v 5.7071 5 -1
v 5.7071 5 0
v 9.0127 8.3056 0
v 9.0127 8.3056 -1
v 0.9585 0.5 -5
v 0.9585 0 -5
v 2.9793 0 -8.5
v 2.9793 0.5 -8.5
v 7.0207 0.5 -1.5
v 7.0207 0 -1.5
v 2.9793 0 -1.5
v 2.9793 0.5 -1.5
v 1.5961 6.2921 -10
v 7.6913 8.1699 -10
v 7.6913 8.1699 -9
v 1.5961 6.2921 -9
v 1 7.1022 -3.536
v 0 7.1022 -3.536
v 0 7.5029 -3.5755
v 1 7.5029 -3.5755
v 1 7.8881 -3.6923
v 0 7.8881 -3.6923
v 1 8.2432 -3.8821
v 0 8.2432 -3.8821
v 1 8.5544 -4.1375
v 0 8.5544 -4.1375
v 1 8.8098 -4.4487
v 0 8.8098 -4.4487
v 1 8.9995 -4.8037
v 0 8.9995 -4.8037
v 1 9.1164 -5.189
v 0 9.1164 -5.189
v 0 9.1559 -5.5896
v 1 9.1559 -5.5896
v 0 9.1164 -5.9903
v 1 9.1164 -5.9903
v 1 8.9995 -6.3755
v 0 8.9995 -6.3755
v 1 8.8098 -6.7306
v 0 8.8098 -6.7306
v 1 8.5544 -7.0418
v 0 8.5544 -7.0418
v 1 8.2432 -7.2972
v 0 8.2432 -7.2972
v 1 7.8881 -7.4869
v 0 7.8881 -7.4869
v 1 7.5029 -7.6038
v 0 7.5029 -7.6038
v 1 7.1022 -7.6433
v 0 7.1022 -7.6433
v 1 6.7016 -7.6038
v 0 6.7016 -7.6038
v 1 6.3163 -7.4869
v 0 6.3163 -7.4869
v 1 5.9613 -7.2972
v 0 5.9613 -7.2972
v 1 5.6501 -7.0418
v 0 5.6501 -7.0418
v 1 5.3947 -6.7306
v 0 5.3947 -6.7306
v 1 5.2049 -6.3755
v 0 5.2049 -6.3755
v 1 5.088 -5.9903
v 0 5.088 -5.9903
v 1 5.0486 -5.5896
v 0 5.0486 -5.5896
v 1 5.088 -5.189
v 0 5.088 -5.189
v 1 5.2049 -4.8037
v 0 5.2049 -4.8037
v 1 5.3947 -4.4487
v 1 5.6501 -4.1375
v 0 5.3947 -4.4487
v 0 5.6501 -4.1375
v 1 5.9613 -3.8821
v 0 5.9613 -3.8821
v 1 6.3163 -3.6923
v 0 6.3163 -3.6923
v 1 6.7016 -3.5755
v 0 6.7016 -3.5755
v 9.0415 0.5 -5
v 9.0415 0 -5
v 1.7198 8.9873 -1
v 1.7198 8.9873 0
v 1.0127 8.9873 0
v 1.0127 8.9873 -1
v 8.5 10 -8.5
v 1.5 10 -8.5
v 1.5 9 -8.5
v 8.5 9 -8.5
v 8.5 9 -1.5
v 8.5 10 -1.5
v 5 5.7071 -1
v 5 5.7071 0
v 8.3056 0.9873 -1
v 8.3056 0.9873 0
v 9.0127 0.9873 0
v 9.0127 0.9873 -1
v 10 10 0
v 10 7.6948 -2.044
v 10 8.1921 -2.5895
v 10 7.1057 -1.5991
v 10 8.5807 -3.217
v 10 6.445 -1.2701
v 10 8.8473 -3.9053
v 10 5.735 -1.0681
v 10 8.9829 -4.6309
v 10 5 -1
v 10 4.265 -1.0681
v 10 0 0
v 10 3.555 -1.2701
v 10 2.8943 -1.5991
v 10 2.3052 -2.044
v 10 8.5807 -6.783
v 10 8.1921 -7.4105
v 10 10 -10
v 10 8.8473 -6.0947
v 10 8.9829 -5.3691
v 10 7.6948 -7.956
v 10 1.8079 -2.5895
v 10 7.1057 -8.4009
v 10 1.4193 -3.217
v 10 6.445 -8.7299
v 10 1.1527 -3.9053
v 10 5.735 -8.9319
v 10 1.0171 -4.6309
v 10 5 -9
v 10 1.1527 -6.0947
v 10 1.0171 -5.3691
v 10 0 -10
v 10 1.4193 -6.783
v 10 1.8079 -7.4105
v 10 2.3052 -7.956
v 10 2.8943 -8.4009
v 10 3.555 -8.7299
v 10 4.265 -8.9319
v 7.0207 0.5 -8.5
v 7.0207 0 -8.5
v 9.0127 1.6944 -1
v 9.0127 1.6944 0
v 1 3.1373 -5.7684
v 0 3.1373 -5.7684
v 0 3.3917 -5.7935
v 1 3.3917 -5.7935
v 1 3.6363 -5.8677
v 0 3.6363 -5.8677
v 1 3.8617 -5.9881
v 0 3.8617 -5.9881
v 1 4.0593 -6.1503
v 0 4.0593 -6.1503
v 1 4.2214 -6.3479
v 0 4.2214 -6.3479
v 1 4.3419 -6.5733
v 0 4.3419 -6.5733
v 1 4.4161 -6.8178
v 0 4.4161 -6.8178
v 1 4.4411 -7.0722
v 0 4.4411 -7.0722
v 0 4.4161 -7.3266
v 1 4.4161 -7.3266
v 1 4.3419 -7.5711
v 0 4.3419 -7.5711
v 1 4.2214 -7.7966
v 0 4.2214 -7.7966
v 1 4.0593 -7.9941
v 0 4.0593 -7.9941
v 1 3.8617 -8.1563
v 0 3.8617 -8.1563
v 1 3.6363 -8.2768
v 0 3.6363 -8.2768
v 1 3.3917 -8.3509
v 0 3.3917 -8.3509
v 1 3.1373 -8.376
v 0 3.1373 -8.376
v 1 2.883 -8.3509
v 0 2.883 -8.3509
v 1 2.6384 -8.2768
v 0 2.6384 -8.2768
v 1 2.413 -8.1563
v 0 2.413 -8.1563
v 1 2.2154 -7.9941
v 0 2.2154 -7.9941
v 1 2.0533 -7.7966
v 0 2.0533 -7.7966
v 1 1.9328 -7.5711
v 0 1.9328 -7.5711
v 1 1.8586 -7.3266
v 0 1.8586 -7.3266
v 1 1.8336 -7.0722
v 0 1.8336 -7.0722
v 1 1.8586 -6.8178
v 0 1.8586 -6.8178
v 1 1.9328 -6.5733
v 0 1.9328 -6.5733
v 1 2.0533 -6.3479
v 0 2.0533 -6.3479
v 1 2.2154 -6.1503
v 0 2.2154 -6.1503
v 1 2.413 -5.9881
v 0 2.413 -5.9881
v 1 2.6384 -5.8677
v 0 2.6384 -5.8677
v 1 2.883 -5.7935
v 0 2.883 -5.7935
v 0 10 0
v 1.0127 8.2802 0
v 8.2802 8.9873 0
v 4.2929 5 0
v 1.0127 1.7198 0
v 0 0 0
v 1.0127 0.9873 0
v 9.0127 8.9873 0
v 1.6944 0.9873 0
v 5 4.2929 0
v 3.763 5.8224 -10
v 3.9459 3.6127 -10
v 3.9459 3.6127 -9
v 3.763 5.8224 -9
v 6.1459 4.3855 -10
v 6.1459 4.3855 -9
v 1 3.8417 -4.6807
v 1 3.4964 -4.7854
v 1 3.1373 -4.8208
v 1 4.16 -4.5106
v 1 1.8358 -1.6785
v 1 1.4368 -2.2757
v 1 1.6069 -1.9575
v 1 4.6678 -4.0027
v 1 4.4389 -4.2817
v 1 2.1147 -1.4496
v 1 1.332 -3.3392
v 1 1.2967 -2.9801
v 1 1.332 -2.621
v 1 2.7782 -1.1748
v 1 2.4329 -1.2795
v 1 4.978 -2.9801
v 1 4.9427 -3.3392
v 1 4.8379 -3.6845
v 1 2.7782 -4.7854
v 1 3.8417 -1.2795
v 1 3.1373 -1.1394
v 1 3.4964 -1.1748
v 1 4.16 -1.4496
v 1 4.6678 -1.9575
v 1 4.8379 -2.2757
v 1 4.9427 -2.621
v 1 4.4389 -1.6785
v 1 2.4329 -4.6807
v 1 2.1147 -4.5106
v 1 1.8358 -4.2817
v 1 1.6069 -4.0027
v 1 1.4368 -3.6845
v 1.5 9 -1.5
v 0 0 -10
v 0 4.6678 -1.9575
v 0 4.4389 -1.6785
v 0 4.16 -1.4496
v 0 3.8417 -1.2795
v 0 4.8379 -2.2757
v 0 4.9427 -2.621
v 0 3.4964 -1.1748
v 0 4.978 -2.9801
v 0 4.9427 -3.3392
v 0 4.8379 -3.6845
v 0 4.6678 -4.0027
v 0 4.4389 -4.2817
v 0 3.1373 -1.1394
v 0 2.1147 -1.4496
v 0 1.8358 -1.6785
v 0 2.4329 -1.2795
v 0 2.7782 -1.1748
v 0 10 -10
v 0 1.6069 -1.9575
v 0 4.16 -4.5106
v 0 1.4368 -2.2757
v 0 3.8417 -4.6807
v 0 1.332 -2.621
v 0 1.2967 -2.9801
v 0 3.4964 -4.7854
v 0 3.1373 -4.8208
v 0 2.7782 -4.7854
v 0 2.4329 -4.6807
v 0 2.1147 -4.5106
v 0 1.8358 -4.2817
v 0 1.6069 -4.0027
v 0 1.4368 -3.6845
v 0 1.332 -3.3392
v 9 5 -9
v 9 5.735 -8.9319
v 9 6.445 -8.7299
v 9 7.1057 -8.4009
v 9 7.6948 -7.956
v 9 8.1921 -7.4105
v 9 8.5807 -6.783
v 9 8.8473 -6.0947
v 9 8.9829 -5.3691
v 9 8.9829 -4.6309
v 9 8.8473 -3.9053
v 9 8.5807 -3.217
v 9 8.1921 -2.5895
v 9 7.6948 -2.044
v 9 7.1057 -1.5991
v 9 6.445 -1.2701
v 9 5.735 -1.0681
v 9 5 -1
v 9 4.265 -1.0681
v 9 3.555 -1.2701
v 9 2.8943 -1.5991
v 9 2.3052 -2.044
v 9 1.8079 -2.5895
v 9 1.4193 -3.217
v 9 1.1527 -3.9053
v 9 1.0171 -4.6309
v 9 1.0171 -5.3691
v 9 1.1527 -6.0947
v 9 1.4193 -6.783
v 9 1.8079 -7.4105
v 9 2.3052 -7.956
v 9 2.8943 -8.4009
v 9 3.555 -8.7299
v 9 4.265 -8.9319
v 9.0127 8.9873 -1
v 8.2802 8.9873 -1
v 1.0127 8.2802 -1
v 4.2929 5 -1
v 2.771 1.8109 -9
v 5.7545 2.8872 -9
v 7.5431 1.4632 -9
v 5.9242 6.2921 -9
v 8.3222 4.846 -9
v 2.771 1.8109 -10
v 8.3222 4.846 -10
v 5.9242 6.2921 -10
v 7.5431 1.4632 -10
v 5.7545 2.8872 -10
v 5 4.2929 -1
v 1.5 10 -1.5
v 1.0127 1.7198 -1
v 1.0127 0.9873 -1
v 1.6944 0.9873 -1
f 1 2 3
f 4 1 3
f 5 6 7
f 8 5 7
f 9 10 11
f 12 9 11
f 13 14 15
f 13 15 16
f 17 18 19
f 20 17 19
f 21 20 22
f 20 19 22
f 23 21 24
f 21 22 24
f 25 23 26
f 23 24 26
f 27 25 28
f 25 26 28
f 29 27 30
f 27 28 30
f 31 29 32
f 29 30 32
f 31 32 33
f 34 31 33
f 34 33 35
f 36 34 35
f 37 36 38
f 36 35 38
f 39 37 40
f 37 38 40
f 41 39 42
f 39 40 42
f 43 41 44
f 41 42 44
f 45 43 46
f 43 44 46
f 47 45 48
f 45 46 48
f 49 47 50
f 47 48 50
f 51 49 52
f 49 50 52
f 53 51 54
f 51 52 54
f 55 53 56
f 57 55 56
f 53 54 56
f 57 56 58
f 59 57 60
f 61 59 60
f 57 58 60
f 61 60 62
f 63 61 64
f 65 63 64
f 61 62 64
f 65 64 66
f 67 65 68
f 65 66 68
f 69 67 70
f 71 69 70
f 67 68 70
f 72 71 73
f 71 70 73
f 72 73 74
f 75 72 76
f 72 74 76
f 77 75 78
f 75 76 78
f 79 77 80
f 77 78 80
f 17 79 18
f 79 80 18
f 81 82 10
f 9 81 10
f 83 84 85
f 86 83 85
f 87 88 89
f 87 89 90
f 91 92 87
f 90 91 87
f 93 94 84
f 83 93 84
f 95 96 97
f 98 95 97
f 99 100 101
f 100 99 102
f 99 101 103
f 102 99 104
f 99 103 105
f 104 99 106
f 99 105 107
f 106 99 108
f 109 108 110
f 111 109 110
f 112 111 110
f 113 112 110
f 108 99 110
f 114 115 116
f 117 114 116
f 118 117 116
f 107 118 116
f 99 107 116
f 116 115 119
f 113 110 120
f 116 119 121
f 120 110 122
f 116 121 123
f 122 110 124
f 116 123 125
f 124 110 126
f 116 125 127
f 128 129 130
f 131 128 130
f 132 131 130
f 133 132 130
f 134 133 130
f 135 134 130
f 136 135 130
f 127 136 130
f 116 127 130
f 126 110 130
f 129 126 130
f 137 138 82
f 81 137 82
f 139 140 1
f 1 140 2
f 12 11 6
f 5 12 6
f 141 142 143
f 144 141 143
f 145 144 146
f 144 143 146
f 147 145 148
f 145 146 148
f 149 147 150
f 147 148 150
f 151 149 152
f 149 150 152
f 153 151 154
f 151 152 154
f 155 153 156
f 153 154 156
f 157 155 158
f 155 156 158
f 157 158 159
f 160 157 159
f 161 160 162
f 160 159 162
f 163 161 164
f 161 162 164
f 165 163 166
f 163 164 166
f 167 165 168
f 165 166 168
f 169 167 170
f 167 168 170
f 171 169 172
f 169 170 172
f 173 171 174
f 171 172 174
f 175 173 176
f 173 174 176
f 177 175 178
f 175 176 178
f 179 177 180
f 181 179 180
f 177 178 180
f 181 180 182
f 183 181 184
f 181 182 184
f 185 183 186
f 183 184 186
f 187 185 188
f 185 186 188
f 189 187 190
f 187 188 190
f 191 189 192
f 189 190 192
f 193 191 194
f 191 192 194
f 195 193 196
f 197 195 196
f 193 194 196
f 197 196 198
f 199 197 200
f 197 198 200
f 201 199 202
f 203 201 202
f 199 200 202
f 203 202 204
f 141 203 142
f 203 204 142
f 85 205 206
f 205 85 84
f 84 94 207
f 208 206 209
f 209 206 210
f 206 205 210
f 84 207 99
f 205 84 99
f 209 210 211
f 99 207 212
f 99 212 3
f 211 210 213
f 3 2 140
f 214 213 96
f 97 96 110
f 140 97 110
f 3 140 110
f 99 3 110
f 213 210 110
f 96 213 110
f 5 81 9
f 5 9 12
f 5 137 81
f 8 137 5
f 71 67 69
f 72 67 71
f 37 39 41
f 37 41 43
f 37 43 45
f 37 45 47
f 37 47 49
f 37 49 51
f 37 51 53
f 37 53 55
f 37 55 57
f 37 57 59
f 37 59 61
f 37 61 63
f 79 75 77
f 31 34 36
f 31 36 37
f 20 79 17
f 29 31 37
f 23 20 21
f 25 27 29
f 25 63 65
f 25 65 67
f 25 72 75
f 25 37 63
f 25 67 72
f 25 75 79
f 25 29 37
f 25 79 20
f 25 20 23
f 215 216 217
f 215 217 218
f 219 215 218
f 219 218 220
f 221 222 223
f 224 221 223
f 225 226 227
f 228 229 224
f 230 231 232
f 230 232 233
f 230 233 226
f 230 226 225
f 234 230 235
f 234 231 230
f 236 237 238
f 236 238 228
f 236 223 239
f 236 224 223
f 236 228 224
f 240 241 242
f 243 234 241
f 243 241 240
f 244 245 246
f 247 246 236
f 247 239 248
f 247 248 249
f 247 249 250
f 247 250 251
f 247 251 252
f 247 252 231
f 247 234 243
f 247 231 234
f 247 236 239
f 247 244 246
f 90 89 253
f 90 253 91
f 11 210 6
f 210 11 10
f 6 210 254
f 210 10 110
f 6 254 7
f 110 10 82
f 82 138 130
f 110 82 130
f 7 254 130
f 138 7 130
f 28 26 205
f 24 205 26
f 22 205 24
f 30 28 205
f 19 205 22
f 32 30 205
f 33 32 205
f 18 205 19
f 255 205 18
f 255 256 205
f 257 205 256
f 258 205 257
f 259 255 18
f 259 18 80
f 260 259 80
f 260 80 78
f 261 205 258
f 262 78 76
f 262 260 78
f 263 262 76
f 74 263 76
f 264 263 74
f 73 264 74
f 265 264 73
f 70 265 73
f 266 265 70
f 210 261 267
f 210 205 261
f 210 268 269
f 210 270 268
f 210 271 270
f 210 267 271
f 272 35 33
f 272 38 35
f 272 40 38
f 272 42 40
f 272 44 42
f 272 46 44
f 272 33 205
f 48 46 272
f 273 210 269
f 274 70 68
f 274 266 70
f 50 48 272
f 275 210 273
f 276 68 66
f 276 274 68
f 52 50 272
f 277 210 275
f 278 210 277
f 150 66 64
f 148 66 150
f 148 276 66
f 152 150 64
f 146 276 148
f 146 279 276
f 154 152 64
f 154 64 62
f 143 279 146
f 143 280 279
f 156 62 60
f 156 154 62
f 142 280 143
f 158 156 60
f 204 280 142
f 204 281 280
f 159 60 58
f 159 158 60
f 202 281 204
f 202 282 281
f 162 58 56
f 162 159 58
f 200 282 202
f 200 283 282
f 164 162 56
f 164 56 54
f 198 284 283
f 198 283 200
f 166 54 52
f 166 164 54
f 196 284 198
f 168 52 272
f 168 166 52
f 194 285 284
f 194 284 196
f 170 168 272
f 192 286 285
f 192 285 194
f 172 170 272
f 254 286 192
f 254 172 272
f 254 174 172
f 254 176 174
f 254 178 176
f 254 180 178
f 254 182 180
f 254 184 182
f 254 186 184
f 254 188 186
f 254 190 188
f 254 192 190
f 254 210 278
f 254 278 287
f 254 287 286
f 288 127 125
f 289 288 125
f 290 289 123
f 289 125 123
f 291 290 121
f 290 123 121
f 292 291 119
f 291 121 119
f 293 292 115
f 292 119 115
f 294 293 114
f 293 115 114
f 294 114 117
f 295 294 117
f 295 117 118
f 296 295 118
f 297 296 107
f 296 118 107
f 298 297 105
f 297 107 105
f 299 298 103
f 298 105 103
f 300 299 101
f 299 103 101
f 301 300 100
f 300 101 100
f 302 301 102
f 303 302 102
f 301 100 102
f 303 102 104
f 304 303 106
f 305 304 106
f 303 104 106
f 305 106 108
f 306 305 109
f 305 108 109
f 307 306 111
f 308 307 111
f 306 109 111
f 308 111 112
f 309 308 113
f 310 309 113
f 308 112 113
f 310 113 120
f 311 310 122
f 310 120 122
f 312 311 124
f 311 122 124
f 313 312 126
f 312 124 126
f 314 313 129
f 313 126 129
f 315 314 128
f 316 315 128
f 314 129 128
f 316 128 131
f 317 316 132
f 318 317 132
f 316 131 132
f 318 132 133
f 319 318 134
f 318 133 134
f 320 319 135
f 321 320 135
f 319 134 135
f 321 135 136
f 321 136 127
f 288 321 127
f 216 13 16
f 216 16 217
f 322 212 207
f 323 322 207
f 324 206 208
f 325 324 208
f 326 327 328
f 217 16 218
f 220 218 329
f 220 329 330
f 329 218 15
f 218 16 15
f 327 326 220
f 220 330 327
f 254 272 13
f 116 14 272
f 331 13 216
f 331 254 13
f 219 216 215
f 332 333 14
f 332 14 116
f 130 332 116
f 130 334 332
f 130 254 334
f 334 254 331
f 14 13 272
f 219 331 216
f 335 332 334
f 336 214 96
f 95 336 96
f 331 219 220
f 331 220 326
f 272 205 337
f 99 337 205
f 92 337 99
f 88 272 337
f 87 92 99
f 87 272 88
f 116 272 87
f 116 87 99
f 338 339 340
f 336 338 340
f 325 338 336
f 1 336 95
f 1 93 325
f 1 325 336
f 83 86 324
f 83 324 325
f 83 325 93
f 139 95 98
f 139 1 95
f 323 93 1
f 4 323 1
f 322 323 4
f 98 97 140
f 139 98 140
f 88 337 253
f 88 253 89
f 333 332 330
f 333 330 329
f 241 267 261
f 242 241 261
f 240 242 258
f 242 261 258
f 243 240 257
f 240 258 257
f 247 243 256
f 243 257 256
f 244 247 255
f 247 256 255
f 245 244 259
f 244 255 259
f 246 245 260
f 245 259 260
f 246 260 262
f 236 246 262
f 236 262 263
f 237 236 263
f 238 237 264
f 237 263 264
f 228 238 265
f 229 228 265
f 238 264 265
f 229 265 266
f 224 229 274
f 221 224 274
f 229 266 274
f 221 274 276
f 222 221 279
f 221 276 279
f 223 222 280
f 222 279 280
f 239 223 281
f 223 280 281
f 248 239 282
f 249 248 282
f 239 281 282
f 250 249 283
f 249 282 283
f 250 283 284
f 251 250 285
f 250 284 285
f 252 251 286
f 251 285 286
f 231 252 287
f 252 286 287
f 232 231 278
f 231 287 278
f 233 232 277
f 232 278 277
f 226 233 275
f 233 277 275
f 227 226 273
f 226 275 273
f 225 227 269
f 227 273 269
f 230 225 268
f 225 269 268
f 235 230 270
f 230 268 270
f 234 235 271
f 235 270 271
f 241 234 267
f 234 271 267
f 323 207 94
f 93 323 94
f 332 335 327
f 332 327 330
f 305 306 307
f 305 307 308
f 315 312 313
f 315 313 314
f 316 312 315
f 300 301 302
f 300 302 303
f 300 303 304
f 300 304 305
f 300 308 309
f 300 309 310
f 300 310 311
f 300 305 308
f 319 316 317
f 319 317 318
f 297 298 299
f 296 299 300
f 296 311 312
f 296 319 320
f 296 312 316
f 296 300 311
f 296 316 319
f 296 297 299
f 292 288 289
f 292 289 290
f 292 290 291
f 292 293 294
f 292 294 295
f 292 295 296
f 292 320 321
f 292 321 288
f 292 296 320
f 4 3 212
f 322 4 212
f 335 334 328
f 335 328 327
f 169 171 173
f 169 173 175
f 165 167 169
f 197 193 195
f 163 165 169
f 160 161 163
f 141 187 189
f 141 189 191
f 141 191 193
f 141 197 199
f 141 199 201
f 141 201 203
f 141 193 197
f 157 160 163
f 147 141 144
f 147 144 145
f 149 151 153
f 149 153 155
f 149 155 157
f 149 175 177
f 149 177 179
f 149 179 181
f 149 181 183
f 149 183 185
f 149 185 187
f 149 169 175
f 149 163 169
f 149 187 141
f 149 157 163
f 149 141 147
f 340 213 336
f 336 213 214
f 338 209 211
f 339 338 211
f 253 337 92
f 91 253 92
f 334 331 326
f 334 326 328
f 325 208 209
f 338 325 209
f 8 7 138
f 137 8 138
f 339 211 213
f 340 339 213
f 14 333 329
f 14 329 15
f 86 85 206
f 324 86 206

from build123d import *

# Parameters (mm, degrees)
SKETCH2_W           = 10
SKETCH2_H           = 10
BOSS_EXTRUDE1_DEPTH = 10
CUT_EXTRUDE1_DEPTH  = 1
SKETCH4_R           = 4
CUT_EXTRUDE2_DEPTH  = 1
SKETCH5_W           = 7
SKETCH5_H           = 7
CUT_EXTRUDE3_DEPTH  = 1
CUT_EXTRUDE4_DEPTH  = 1
SKETCH7_R           = 1.303792798
SKETCH7_R_2         = 2.05363311
SKETCH7_R_3         = 1.840686576
CUT_EXTRUDE5_DEPTH  = 1
CUT_EXTRUDE13_DEPTH = 0.5


with BuildPart() as part:
    # Sketch2 → Boss-Extrude1 (new body)
    with BuildSketch(Plane(origin=(0, 0, 0), x_dir=(1, 0, 0), z_dir=(0, 1, 0))):
        with Locations((5, 5)):
            Rectangle(SKETCH2_W, SKETCH2_H)
    extrude(amount=BOSS_EXTRUDE1_DEPTH)

    # Sketch3 → Cut-Extrude1 (cut)
    with BuildSketch(Plane.XY):
        Polygon((8.305584857, 0.987308362), (9.012691638, 0.987308362), (9.012691638, 1.694415143), (5.707106781, 5), (9.012691638, 8.305584857), (9.012691638, 8.987308362), (8.280201581, 8.987308362), (5, 5.707106781), (1.719798419, 8.987308362), (1.012691638, 8.987308362), (1.012691638, 8.280201581), (4.292893219, 5), (1.012691638, 1.719798419), (1.012691638, 0.987308362), (1.694415143, 0.987308362), (5, 4.292893219), align=None)
    extrude(amount=-CUT_EXTRUDE1_DEPTH, mode=Mode.SUBTRACT)

    # Sketch4 → Cut-Extrude2 (cut)
    with BuildSketch(Plane(origin=(10, 0, 0), x_dir=(0, 0, -1), z_dir=(1, 0, 0))):
        with Locations((5, 5)):
            Circle(SKETCH4_R)
    extrude(amount=-CUT_EXTRUDE2_DEPTH, mode=Mode.SUBTRACT)

    # Sketch5 → Cut-Extrude3 (cut)
    with BuildSketch(Plane(origin=(0, 10, 0), x_dir=(1, 0, 0), z_dir=(0, 1, 0))):
        with Locations((5, 5)):
            Rectangle(SKETCH5_W, SKETCH5_H)
    extrude(amount=-CUT_EXTRUDE3_DEPTH, mode=Mode.SUBTRACT)

    # Sketch6 → Cut-Extrude4 (cut)
    with BuildSketch(Plane(origin=(0, 0, -10), x_dir=(-1, 0, 0), z_dir=(0, 0, -1))):
        Polygon((-7.691273898, 8.169929887), (-1.596078599, 6.292074313), (-3.945946393, 3.612705427), (-3.762984072, 5.82237163), (-6.145851296, 4.385481263), (-2.771012496, 1.810947861), (-7.54308372, 1.463168774), (-5.754546035, 2.887207167), (-8.32224735, 4.846006741), (-5.924161107, 6.292074313), align=None)
    extrude(amount=-CUT_EXTRUDE4_DEPTH, mode=Mode.SUBTRACT)

    # Sketch7 → Cut-Extrude5 (cut)
    with BuildSketch(Plane.ZY):
        with Locations((-7.072203837, 3.137345215)):
            Circle(SKETCH7_R)
        with Locations((-5.589634204, 7.102221042)):
            Circle(SKETCH7_R_2)
        with Locations((-2.980104129, 3.137345215)):
            Circle(SKETCH7_R_3)
    extrude(amount=-CUT_EXTRUDE5_DEPTH, mode=Mode.SUBTRACT)

    # Sketch9 → Cut-Extrude13 (cut)
    with BuildSketch(Plane(origin=(0, 0, 0), x_dir=(-1, 0, 0), z_dir=(0, -1, 0))):
        Polygon((-9.041451884, 5), (-7.020725942, 1.5), (-2.979274058, 1.5), (-0.958548116, 5), (-2.979274058, 8.5), (-7.020725942, 8.5), align=None)
    extrude(amount=-CUT_EXTRUDE13_DEPTH, mode=Mode.SUBTRACT)


solid = part.part
